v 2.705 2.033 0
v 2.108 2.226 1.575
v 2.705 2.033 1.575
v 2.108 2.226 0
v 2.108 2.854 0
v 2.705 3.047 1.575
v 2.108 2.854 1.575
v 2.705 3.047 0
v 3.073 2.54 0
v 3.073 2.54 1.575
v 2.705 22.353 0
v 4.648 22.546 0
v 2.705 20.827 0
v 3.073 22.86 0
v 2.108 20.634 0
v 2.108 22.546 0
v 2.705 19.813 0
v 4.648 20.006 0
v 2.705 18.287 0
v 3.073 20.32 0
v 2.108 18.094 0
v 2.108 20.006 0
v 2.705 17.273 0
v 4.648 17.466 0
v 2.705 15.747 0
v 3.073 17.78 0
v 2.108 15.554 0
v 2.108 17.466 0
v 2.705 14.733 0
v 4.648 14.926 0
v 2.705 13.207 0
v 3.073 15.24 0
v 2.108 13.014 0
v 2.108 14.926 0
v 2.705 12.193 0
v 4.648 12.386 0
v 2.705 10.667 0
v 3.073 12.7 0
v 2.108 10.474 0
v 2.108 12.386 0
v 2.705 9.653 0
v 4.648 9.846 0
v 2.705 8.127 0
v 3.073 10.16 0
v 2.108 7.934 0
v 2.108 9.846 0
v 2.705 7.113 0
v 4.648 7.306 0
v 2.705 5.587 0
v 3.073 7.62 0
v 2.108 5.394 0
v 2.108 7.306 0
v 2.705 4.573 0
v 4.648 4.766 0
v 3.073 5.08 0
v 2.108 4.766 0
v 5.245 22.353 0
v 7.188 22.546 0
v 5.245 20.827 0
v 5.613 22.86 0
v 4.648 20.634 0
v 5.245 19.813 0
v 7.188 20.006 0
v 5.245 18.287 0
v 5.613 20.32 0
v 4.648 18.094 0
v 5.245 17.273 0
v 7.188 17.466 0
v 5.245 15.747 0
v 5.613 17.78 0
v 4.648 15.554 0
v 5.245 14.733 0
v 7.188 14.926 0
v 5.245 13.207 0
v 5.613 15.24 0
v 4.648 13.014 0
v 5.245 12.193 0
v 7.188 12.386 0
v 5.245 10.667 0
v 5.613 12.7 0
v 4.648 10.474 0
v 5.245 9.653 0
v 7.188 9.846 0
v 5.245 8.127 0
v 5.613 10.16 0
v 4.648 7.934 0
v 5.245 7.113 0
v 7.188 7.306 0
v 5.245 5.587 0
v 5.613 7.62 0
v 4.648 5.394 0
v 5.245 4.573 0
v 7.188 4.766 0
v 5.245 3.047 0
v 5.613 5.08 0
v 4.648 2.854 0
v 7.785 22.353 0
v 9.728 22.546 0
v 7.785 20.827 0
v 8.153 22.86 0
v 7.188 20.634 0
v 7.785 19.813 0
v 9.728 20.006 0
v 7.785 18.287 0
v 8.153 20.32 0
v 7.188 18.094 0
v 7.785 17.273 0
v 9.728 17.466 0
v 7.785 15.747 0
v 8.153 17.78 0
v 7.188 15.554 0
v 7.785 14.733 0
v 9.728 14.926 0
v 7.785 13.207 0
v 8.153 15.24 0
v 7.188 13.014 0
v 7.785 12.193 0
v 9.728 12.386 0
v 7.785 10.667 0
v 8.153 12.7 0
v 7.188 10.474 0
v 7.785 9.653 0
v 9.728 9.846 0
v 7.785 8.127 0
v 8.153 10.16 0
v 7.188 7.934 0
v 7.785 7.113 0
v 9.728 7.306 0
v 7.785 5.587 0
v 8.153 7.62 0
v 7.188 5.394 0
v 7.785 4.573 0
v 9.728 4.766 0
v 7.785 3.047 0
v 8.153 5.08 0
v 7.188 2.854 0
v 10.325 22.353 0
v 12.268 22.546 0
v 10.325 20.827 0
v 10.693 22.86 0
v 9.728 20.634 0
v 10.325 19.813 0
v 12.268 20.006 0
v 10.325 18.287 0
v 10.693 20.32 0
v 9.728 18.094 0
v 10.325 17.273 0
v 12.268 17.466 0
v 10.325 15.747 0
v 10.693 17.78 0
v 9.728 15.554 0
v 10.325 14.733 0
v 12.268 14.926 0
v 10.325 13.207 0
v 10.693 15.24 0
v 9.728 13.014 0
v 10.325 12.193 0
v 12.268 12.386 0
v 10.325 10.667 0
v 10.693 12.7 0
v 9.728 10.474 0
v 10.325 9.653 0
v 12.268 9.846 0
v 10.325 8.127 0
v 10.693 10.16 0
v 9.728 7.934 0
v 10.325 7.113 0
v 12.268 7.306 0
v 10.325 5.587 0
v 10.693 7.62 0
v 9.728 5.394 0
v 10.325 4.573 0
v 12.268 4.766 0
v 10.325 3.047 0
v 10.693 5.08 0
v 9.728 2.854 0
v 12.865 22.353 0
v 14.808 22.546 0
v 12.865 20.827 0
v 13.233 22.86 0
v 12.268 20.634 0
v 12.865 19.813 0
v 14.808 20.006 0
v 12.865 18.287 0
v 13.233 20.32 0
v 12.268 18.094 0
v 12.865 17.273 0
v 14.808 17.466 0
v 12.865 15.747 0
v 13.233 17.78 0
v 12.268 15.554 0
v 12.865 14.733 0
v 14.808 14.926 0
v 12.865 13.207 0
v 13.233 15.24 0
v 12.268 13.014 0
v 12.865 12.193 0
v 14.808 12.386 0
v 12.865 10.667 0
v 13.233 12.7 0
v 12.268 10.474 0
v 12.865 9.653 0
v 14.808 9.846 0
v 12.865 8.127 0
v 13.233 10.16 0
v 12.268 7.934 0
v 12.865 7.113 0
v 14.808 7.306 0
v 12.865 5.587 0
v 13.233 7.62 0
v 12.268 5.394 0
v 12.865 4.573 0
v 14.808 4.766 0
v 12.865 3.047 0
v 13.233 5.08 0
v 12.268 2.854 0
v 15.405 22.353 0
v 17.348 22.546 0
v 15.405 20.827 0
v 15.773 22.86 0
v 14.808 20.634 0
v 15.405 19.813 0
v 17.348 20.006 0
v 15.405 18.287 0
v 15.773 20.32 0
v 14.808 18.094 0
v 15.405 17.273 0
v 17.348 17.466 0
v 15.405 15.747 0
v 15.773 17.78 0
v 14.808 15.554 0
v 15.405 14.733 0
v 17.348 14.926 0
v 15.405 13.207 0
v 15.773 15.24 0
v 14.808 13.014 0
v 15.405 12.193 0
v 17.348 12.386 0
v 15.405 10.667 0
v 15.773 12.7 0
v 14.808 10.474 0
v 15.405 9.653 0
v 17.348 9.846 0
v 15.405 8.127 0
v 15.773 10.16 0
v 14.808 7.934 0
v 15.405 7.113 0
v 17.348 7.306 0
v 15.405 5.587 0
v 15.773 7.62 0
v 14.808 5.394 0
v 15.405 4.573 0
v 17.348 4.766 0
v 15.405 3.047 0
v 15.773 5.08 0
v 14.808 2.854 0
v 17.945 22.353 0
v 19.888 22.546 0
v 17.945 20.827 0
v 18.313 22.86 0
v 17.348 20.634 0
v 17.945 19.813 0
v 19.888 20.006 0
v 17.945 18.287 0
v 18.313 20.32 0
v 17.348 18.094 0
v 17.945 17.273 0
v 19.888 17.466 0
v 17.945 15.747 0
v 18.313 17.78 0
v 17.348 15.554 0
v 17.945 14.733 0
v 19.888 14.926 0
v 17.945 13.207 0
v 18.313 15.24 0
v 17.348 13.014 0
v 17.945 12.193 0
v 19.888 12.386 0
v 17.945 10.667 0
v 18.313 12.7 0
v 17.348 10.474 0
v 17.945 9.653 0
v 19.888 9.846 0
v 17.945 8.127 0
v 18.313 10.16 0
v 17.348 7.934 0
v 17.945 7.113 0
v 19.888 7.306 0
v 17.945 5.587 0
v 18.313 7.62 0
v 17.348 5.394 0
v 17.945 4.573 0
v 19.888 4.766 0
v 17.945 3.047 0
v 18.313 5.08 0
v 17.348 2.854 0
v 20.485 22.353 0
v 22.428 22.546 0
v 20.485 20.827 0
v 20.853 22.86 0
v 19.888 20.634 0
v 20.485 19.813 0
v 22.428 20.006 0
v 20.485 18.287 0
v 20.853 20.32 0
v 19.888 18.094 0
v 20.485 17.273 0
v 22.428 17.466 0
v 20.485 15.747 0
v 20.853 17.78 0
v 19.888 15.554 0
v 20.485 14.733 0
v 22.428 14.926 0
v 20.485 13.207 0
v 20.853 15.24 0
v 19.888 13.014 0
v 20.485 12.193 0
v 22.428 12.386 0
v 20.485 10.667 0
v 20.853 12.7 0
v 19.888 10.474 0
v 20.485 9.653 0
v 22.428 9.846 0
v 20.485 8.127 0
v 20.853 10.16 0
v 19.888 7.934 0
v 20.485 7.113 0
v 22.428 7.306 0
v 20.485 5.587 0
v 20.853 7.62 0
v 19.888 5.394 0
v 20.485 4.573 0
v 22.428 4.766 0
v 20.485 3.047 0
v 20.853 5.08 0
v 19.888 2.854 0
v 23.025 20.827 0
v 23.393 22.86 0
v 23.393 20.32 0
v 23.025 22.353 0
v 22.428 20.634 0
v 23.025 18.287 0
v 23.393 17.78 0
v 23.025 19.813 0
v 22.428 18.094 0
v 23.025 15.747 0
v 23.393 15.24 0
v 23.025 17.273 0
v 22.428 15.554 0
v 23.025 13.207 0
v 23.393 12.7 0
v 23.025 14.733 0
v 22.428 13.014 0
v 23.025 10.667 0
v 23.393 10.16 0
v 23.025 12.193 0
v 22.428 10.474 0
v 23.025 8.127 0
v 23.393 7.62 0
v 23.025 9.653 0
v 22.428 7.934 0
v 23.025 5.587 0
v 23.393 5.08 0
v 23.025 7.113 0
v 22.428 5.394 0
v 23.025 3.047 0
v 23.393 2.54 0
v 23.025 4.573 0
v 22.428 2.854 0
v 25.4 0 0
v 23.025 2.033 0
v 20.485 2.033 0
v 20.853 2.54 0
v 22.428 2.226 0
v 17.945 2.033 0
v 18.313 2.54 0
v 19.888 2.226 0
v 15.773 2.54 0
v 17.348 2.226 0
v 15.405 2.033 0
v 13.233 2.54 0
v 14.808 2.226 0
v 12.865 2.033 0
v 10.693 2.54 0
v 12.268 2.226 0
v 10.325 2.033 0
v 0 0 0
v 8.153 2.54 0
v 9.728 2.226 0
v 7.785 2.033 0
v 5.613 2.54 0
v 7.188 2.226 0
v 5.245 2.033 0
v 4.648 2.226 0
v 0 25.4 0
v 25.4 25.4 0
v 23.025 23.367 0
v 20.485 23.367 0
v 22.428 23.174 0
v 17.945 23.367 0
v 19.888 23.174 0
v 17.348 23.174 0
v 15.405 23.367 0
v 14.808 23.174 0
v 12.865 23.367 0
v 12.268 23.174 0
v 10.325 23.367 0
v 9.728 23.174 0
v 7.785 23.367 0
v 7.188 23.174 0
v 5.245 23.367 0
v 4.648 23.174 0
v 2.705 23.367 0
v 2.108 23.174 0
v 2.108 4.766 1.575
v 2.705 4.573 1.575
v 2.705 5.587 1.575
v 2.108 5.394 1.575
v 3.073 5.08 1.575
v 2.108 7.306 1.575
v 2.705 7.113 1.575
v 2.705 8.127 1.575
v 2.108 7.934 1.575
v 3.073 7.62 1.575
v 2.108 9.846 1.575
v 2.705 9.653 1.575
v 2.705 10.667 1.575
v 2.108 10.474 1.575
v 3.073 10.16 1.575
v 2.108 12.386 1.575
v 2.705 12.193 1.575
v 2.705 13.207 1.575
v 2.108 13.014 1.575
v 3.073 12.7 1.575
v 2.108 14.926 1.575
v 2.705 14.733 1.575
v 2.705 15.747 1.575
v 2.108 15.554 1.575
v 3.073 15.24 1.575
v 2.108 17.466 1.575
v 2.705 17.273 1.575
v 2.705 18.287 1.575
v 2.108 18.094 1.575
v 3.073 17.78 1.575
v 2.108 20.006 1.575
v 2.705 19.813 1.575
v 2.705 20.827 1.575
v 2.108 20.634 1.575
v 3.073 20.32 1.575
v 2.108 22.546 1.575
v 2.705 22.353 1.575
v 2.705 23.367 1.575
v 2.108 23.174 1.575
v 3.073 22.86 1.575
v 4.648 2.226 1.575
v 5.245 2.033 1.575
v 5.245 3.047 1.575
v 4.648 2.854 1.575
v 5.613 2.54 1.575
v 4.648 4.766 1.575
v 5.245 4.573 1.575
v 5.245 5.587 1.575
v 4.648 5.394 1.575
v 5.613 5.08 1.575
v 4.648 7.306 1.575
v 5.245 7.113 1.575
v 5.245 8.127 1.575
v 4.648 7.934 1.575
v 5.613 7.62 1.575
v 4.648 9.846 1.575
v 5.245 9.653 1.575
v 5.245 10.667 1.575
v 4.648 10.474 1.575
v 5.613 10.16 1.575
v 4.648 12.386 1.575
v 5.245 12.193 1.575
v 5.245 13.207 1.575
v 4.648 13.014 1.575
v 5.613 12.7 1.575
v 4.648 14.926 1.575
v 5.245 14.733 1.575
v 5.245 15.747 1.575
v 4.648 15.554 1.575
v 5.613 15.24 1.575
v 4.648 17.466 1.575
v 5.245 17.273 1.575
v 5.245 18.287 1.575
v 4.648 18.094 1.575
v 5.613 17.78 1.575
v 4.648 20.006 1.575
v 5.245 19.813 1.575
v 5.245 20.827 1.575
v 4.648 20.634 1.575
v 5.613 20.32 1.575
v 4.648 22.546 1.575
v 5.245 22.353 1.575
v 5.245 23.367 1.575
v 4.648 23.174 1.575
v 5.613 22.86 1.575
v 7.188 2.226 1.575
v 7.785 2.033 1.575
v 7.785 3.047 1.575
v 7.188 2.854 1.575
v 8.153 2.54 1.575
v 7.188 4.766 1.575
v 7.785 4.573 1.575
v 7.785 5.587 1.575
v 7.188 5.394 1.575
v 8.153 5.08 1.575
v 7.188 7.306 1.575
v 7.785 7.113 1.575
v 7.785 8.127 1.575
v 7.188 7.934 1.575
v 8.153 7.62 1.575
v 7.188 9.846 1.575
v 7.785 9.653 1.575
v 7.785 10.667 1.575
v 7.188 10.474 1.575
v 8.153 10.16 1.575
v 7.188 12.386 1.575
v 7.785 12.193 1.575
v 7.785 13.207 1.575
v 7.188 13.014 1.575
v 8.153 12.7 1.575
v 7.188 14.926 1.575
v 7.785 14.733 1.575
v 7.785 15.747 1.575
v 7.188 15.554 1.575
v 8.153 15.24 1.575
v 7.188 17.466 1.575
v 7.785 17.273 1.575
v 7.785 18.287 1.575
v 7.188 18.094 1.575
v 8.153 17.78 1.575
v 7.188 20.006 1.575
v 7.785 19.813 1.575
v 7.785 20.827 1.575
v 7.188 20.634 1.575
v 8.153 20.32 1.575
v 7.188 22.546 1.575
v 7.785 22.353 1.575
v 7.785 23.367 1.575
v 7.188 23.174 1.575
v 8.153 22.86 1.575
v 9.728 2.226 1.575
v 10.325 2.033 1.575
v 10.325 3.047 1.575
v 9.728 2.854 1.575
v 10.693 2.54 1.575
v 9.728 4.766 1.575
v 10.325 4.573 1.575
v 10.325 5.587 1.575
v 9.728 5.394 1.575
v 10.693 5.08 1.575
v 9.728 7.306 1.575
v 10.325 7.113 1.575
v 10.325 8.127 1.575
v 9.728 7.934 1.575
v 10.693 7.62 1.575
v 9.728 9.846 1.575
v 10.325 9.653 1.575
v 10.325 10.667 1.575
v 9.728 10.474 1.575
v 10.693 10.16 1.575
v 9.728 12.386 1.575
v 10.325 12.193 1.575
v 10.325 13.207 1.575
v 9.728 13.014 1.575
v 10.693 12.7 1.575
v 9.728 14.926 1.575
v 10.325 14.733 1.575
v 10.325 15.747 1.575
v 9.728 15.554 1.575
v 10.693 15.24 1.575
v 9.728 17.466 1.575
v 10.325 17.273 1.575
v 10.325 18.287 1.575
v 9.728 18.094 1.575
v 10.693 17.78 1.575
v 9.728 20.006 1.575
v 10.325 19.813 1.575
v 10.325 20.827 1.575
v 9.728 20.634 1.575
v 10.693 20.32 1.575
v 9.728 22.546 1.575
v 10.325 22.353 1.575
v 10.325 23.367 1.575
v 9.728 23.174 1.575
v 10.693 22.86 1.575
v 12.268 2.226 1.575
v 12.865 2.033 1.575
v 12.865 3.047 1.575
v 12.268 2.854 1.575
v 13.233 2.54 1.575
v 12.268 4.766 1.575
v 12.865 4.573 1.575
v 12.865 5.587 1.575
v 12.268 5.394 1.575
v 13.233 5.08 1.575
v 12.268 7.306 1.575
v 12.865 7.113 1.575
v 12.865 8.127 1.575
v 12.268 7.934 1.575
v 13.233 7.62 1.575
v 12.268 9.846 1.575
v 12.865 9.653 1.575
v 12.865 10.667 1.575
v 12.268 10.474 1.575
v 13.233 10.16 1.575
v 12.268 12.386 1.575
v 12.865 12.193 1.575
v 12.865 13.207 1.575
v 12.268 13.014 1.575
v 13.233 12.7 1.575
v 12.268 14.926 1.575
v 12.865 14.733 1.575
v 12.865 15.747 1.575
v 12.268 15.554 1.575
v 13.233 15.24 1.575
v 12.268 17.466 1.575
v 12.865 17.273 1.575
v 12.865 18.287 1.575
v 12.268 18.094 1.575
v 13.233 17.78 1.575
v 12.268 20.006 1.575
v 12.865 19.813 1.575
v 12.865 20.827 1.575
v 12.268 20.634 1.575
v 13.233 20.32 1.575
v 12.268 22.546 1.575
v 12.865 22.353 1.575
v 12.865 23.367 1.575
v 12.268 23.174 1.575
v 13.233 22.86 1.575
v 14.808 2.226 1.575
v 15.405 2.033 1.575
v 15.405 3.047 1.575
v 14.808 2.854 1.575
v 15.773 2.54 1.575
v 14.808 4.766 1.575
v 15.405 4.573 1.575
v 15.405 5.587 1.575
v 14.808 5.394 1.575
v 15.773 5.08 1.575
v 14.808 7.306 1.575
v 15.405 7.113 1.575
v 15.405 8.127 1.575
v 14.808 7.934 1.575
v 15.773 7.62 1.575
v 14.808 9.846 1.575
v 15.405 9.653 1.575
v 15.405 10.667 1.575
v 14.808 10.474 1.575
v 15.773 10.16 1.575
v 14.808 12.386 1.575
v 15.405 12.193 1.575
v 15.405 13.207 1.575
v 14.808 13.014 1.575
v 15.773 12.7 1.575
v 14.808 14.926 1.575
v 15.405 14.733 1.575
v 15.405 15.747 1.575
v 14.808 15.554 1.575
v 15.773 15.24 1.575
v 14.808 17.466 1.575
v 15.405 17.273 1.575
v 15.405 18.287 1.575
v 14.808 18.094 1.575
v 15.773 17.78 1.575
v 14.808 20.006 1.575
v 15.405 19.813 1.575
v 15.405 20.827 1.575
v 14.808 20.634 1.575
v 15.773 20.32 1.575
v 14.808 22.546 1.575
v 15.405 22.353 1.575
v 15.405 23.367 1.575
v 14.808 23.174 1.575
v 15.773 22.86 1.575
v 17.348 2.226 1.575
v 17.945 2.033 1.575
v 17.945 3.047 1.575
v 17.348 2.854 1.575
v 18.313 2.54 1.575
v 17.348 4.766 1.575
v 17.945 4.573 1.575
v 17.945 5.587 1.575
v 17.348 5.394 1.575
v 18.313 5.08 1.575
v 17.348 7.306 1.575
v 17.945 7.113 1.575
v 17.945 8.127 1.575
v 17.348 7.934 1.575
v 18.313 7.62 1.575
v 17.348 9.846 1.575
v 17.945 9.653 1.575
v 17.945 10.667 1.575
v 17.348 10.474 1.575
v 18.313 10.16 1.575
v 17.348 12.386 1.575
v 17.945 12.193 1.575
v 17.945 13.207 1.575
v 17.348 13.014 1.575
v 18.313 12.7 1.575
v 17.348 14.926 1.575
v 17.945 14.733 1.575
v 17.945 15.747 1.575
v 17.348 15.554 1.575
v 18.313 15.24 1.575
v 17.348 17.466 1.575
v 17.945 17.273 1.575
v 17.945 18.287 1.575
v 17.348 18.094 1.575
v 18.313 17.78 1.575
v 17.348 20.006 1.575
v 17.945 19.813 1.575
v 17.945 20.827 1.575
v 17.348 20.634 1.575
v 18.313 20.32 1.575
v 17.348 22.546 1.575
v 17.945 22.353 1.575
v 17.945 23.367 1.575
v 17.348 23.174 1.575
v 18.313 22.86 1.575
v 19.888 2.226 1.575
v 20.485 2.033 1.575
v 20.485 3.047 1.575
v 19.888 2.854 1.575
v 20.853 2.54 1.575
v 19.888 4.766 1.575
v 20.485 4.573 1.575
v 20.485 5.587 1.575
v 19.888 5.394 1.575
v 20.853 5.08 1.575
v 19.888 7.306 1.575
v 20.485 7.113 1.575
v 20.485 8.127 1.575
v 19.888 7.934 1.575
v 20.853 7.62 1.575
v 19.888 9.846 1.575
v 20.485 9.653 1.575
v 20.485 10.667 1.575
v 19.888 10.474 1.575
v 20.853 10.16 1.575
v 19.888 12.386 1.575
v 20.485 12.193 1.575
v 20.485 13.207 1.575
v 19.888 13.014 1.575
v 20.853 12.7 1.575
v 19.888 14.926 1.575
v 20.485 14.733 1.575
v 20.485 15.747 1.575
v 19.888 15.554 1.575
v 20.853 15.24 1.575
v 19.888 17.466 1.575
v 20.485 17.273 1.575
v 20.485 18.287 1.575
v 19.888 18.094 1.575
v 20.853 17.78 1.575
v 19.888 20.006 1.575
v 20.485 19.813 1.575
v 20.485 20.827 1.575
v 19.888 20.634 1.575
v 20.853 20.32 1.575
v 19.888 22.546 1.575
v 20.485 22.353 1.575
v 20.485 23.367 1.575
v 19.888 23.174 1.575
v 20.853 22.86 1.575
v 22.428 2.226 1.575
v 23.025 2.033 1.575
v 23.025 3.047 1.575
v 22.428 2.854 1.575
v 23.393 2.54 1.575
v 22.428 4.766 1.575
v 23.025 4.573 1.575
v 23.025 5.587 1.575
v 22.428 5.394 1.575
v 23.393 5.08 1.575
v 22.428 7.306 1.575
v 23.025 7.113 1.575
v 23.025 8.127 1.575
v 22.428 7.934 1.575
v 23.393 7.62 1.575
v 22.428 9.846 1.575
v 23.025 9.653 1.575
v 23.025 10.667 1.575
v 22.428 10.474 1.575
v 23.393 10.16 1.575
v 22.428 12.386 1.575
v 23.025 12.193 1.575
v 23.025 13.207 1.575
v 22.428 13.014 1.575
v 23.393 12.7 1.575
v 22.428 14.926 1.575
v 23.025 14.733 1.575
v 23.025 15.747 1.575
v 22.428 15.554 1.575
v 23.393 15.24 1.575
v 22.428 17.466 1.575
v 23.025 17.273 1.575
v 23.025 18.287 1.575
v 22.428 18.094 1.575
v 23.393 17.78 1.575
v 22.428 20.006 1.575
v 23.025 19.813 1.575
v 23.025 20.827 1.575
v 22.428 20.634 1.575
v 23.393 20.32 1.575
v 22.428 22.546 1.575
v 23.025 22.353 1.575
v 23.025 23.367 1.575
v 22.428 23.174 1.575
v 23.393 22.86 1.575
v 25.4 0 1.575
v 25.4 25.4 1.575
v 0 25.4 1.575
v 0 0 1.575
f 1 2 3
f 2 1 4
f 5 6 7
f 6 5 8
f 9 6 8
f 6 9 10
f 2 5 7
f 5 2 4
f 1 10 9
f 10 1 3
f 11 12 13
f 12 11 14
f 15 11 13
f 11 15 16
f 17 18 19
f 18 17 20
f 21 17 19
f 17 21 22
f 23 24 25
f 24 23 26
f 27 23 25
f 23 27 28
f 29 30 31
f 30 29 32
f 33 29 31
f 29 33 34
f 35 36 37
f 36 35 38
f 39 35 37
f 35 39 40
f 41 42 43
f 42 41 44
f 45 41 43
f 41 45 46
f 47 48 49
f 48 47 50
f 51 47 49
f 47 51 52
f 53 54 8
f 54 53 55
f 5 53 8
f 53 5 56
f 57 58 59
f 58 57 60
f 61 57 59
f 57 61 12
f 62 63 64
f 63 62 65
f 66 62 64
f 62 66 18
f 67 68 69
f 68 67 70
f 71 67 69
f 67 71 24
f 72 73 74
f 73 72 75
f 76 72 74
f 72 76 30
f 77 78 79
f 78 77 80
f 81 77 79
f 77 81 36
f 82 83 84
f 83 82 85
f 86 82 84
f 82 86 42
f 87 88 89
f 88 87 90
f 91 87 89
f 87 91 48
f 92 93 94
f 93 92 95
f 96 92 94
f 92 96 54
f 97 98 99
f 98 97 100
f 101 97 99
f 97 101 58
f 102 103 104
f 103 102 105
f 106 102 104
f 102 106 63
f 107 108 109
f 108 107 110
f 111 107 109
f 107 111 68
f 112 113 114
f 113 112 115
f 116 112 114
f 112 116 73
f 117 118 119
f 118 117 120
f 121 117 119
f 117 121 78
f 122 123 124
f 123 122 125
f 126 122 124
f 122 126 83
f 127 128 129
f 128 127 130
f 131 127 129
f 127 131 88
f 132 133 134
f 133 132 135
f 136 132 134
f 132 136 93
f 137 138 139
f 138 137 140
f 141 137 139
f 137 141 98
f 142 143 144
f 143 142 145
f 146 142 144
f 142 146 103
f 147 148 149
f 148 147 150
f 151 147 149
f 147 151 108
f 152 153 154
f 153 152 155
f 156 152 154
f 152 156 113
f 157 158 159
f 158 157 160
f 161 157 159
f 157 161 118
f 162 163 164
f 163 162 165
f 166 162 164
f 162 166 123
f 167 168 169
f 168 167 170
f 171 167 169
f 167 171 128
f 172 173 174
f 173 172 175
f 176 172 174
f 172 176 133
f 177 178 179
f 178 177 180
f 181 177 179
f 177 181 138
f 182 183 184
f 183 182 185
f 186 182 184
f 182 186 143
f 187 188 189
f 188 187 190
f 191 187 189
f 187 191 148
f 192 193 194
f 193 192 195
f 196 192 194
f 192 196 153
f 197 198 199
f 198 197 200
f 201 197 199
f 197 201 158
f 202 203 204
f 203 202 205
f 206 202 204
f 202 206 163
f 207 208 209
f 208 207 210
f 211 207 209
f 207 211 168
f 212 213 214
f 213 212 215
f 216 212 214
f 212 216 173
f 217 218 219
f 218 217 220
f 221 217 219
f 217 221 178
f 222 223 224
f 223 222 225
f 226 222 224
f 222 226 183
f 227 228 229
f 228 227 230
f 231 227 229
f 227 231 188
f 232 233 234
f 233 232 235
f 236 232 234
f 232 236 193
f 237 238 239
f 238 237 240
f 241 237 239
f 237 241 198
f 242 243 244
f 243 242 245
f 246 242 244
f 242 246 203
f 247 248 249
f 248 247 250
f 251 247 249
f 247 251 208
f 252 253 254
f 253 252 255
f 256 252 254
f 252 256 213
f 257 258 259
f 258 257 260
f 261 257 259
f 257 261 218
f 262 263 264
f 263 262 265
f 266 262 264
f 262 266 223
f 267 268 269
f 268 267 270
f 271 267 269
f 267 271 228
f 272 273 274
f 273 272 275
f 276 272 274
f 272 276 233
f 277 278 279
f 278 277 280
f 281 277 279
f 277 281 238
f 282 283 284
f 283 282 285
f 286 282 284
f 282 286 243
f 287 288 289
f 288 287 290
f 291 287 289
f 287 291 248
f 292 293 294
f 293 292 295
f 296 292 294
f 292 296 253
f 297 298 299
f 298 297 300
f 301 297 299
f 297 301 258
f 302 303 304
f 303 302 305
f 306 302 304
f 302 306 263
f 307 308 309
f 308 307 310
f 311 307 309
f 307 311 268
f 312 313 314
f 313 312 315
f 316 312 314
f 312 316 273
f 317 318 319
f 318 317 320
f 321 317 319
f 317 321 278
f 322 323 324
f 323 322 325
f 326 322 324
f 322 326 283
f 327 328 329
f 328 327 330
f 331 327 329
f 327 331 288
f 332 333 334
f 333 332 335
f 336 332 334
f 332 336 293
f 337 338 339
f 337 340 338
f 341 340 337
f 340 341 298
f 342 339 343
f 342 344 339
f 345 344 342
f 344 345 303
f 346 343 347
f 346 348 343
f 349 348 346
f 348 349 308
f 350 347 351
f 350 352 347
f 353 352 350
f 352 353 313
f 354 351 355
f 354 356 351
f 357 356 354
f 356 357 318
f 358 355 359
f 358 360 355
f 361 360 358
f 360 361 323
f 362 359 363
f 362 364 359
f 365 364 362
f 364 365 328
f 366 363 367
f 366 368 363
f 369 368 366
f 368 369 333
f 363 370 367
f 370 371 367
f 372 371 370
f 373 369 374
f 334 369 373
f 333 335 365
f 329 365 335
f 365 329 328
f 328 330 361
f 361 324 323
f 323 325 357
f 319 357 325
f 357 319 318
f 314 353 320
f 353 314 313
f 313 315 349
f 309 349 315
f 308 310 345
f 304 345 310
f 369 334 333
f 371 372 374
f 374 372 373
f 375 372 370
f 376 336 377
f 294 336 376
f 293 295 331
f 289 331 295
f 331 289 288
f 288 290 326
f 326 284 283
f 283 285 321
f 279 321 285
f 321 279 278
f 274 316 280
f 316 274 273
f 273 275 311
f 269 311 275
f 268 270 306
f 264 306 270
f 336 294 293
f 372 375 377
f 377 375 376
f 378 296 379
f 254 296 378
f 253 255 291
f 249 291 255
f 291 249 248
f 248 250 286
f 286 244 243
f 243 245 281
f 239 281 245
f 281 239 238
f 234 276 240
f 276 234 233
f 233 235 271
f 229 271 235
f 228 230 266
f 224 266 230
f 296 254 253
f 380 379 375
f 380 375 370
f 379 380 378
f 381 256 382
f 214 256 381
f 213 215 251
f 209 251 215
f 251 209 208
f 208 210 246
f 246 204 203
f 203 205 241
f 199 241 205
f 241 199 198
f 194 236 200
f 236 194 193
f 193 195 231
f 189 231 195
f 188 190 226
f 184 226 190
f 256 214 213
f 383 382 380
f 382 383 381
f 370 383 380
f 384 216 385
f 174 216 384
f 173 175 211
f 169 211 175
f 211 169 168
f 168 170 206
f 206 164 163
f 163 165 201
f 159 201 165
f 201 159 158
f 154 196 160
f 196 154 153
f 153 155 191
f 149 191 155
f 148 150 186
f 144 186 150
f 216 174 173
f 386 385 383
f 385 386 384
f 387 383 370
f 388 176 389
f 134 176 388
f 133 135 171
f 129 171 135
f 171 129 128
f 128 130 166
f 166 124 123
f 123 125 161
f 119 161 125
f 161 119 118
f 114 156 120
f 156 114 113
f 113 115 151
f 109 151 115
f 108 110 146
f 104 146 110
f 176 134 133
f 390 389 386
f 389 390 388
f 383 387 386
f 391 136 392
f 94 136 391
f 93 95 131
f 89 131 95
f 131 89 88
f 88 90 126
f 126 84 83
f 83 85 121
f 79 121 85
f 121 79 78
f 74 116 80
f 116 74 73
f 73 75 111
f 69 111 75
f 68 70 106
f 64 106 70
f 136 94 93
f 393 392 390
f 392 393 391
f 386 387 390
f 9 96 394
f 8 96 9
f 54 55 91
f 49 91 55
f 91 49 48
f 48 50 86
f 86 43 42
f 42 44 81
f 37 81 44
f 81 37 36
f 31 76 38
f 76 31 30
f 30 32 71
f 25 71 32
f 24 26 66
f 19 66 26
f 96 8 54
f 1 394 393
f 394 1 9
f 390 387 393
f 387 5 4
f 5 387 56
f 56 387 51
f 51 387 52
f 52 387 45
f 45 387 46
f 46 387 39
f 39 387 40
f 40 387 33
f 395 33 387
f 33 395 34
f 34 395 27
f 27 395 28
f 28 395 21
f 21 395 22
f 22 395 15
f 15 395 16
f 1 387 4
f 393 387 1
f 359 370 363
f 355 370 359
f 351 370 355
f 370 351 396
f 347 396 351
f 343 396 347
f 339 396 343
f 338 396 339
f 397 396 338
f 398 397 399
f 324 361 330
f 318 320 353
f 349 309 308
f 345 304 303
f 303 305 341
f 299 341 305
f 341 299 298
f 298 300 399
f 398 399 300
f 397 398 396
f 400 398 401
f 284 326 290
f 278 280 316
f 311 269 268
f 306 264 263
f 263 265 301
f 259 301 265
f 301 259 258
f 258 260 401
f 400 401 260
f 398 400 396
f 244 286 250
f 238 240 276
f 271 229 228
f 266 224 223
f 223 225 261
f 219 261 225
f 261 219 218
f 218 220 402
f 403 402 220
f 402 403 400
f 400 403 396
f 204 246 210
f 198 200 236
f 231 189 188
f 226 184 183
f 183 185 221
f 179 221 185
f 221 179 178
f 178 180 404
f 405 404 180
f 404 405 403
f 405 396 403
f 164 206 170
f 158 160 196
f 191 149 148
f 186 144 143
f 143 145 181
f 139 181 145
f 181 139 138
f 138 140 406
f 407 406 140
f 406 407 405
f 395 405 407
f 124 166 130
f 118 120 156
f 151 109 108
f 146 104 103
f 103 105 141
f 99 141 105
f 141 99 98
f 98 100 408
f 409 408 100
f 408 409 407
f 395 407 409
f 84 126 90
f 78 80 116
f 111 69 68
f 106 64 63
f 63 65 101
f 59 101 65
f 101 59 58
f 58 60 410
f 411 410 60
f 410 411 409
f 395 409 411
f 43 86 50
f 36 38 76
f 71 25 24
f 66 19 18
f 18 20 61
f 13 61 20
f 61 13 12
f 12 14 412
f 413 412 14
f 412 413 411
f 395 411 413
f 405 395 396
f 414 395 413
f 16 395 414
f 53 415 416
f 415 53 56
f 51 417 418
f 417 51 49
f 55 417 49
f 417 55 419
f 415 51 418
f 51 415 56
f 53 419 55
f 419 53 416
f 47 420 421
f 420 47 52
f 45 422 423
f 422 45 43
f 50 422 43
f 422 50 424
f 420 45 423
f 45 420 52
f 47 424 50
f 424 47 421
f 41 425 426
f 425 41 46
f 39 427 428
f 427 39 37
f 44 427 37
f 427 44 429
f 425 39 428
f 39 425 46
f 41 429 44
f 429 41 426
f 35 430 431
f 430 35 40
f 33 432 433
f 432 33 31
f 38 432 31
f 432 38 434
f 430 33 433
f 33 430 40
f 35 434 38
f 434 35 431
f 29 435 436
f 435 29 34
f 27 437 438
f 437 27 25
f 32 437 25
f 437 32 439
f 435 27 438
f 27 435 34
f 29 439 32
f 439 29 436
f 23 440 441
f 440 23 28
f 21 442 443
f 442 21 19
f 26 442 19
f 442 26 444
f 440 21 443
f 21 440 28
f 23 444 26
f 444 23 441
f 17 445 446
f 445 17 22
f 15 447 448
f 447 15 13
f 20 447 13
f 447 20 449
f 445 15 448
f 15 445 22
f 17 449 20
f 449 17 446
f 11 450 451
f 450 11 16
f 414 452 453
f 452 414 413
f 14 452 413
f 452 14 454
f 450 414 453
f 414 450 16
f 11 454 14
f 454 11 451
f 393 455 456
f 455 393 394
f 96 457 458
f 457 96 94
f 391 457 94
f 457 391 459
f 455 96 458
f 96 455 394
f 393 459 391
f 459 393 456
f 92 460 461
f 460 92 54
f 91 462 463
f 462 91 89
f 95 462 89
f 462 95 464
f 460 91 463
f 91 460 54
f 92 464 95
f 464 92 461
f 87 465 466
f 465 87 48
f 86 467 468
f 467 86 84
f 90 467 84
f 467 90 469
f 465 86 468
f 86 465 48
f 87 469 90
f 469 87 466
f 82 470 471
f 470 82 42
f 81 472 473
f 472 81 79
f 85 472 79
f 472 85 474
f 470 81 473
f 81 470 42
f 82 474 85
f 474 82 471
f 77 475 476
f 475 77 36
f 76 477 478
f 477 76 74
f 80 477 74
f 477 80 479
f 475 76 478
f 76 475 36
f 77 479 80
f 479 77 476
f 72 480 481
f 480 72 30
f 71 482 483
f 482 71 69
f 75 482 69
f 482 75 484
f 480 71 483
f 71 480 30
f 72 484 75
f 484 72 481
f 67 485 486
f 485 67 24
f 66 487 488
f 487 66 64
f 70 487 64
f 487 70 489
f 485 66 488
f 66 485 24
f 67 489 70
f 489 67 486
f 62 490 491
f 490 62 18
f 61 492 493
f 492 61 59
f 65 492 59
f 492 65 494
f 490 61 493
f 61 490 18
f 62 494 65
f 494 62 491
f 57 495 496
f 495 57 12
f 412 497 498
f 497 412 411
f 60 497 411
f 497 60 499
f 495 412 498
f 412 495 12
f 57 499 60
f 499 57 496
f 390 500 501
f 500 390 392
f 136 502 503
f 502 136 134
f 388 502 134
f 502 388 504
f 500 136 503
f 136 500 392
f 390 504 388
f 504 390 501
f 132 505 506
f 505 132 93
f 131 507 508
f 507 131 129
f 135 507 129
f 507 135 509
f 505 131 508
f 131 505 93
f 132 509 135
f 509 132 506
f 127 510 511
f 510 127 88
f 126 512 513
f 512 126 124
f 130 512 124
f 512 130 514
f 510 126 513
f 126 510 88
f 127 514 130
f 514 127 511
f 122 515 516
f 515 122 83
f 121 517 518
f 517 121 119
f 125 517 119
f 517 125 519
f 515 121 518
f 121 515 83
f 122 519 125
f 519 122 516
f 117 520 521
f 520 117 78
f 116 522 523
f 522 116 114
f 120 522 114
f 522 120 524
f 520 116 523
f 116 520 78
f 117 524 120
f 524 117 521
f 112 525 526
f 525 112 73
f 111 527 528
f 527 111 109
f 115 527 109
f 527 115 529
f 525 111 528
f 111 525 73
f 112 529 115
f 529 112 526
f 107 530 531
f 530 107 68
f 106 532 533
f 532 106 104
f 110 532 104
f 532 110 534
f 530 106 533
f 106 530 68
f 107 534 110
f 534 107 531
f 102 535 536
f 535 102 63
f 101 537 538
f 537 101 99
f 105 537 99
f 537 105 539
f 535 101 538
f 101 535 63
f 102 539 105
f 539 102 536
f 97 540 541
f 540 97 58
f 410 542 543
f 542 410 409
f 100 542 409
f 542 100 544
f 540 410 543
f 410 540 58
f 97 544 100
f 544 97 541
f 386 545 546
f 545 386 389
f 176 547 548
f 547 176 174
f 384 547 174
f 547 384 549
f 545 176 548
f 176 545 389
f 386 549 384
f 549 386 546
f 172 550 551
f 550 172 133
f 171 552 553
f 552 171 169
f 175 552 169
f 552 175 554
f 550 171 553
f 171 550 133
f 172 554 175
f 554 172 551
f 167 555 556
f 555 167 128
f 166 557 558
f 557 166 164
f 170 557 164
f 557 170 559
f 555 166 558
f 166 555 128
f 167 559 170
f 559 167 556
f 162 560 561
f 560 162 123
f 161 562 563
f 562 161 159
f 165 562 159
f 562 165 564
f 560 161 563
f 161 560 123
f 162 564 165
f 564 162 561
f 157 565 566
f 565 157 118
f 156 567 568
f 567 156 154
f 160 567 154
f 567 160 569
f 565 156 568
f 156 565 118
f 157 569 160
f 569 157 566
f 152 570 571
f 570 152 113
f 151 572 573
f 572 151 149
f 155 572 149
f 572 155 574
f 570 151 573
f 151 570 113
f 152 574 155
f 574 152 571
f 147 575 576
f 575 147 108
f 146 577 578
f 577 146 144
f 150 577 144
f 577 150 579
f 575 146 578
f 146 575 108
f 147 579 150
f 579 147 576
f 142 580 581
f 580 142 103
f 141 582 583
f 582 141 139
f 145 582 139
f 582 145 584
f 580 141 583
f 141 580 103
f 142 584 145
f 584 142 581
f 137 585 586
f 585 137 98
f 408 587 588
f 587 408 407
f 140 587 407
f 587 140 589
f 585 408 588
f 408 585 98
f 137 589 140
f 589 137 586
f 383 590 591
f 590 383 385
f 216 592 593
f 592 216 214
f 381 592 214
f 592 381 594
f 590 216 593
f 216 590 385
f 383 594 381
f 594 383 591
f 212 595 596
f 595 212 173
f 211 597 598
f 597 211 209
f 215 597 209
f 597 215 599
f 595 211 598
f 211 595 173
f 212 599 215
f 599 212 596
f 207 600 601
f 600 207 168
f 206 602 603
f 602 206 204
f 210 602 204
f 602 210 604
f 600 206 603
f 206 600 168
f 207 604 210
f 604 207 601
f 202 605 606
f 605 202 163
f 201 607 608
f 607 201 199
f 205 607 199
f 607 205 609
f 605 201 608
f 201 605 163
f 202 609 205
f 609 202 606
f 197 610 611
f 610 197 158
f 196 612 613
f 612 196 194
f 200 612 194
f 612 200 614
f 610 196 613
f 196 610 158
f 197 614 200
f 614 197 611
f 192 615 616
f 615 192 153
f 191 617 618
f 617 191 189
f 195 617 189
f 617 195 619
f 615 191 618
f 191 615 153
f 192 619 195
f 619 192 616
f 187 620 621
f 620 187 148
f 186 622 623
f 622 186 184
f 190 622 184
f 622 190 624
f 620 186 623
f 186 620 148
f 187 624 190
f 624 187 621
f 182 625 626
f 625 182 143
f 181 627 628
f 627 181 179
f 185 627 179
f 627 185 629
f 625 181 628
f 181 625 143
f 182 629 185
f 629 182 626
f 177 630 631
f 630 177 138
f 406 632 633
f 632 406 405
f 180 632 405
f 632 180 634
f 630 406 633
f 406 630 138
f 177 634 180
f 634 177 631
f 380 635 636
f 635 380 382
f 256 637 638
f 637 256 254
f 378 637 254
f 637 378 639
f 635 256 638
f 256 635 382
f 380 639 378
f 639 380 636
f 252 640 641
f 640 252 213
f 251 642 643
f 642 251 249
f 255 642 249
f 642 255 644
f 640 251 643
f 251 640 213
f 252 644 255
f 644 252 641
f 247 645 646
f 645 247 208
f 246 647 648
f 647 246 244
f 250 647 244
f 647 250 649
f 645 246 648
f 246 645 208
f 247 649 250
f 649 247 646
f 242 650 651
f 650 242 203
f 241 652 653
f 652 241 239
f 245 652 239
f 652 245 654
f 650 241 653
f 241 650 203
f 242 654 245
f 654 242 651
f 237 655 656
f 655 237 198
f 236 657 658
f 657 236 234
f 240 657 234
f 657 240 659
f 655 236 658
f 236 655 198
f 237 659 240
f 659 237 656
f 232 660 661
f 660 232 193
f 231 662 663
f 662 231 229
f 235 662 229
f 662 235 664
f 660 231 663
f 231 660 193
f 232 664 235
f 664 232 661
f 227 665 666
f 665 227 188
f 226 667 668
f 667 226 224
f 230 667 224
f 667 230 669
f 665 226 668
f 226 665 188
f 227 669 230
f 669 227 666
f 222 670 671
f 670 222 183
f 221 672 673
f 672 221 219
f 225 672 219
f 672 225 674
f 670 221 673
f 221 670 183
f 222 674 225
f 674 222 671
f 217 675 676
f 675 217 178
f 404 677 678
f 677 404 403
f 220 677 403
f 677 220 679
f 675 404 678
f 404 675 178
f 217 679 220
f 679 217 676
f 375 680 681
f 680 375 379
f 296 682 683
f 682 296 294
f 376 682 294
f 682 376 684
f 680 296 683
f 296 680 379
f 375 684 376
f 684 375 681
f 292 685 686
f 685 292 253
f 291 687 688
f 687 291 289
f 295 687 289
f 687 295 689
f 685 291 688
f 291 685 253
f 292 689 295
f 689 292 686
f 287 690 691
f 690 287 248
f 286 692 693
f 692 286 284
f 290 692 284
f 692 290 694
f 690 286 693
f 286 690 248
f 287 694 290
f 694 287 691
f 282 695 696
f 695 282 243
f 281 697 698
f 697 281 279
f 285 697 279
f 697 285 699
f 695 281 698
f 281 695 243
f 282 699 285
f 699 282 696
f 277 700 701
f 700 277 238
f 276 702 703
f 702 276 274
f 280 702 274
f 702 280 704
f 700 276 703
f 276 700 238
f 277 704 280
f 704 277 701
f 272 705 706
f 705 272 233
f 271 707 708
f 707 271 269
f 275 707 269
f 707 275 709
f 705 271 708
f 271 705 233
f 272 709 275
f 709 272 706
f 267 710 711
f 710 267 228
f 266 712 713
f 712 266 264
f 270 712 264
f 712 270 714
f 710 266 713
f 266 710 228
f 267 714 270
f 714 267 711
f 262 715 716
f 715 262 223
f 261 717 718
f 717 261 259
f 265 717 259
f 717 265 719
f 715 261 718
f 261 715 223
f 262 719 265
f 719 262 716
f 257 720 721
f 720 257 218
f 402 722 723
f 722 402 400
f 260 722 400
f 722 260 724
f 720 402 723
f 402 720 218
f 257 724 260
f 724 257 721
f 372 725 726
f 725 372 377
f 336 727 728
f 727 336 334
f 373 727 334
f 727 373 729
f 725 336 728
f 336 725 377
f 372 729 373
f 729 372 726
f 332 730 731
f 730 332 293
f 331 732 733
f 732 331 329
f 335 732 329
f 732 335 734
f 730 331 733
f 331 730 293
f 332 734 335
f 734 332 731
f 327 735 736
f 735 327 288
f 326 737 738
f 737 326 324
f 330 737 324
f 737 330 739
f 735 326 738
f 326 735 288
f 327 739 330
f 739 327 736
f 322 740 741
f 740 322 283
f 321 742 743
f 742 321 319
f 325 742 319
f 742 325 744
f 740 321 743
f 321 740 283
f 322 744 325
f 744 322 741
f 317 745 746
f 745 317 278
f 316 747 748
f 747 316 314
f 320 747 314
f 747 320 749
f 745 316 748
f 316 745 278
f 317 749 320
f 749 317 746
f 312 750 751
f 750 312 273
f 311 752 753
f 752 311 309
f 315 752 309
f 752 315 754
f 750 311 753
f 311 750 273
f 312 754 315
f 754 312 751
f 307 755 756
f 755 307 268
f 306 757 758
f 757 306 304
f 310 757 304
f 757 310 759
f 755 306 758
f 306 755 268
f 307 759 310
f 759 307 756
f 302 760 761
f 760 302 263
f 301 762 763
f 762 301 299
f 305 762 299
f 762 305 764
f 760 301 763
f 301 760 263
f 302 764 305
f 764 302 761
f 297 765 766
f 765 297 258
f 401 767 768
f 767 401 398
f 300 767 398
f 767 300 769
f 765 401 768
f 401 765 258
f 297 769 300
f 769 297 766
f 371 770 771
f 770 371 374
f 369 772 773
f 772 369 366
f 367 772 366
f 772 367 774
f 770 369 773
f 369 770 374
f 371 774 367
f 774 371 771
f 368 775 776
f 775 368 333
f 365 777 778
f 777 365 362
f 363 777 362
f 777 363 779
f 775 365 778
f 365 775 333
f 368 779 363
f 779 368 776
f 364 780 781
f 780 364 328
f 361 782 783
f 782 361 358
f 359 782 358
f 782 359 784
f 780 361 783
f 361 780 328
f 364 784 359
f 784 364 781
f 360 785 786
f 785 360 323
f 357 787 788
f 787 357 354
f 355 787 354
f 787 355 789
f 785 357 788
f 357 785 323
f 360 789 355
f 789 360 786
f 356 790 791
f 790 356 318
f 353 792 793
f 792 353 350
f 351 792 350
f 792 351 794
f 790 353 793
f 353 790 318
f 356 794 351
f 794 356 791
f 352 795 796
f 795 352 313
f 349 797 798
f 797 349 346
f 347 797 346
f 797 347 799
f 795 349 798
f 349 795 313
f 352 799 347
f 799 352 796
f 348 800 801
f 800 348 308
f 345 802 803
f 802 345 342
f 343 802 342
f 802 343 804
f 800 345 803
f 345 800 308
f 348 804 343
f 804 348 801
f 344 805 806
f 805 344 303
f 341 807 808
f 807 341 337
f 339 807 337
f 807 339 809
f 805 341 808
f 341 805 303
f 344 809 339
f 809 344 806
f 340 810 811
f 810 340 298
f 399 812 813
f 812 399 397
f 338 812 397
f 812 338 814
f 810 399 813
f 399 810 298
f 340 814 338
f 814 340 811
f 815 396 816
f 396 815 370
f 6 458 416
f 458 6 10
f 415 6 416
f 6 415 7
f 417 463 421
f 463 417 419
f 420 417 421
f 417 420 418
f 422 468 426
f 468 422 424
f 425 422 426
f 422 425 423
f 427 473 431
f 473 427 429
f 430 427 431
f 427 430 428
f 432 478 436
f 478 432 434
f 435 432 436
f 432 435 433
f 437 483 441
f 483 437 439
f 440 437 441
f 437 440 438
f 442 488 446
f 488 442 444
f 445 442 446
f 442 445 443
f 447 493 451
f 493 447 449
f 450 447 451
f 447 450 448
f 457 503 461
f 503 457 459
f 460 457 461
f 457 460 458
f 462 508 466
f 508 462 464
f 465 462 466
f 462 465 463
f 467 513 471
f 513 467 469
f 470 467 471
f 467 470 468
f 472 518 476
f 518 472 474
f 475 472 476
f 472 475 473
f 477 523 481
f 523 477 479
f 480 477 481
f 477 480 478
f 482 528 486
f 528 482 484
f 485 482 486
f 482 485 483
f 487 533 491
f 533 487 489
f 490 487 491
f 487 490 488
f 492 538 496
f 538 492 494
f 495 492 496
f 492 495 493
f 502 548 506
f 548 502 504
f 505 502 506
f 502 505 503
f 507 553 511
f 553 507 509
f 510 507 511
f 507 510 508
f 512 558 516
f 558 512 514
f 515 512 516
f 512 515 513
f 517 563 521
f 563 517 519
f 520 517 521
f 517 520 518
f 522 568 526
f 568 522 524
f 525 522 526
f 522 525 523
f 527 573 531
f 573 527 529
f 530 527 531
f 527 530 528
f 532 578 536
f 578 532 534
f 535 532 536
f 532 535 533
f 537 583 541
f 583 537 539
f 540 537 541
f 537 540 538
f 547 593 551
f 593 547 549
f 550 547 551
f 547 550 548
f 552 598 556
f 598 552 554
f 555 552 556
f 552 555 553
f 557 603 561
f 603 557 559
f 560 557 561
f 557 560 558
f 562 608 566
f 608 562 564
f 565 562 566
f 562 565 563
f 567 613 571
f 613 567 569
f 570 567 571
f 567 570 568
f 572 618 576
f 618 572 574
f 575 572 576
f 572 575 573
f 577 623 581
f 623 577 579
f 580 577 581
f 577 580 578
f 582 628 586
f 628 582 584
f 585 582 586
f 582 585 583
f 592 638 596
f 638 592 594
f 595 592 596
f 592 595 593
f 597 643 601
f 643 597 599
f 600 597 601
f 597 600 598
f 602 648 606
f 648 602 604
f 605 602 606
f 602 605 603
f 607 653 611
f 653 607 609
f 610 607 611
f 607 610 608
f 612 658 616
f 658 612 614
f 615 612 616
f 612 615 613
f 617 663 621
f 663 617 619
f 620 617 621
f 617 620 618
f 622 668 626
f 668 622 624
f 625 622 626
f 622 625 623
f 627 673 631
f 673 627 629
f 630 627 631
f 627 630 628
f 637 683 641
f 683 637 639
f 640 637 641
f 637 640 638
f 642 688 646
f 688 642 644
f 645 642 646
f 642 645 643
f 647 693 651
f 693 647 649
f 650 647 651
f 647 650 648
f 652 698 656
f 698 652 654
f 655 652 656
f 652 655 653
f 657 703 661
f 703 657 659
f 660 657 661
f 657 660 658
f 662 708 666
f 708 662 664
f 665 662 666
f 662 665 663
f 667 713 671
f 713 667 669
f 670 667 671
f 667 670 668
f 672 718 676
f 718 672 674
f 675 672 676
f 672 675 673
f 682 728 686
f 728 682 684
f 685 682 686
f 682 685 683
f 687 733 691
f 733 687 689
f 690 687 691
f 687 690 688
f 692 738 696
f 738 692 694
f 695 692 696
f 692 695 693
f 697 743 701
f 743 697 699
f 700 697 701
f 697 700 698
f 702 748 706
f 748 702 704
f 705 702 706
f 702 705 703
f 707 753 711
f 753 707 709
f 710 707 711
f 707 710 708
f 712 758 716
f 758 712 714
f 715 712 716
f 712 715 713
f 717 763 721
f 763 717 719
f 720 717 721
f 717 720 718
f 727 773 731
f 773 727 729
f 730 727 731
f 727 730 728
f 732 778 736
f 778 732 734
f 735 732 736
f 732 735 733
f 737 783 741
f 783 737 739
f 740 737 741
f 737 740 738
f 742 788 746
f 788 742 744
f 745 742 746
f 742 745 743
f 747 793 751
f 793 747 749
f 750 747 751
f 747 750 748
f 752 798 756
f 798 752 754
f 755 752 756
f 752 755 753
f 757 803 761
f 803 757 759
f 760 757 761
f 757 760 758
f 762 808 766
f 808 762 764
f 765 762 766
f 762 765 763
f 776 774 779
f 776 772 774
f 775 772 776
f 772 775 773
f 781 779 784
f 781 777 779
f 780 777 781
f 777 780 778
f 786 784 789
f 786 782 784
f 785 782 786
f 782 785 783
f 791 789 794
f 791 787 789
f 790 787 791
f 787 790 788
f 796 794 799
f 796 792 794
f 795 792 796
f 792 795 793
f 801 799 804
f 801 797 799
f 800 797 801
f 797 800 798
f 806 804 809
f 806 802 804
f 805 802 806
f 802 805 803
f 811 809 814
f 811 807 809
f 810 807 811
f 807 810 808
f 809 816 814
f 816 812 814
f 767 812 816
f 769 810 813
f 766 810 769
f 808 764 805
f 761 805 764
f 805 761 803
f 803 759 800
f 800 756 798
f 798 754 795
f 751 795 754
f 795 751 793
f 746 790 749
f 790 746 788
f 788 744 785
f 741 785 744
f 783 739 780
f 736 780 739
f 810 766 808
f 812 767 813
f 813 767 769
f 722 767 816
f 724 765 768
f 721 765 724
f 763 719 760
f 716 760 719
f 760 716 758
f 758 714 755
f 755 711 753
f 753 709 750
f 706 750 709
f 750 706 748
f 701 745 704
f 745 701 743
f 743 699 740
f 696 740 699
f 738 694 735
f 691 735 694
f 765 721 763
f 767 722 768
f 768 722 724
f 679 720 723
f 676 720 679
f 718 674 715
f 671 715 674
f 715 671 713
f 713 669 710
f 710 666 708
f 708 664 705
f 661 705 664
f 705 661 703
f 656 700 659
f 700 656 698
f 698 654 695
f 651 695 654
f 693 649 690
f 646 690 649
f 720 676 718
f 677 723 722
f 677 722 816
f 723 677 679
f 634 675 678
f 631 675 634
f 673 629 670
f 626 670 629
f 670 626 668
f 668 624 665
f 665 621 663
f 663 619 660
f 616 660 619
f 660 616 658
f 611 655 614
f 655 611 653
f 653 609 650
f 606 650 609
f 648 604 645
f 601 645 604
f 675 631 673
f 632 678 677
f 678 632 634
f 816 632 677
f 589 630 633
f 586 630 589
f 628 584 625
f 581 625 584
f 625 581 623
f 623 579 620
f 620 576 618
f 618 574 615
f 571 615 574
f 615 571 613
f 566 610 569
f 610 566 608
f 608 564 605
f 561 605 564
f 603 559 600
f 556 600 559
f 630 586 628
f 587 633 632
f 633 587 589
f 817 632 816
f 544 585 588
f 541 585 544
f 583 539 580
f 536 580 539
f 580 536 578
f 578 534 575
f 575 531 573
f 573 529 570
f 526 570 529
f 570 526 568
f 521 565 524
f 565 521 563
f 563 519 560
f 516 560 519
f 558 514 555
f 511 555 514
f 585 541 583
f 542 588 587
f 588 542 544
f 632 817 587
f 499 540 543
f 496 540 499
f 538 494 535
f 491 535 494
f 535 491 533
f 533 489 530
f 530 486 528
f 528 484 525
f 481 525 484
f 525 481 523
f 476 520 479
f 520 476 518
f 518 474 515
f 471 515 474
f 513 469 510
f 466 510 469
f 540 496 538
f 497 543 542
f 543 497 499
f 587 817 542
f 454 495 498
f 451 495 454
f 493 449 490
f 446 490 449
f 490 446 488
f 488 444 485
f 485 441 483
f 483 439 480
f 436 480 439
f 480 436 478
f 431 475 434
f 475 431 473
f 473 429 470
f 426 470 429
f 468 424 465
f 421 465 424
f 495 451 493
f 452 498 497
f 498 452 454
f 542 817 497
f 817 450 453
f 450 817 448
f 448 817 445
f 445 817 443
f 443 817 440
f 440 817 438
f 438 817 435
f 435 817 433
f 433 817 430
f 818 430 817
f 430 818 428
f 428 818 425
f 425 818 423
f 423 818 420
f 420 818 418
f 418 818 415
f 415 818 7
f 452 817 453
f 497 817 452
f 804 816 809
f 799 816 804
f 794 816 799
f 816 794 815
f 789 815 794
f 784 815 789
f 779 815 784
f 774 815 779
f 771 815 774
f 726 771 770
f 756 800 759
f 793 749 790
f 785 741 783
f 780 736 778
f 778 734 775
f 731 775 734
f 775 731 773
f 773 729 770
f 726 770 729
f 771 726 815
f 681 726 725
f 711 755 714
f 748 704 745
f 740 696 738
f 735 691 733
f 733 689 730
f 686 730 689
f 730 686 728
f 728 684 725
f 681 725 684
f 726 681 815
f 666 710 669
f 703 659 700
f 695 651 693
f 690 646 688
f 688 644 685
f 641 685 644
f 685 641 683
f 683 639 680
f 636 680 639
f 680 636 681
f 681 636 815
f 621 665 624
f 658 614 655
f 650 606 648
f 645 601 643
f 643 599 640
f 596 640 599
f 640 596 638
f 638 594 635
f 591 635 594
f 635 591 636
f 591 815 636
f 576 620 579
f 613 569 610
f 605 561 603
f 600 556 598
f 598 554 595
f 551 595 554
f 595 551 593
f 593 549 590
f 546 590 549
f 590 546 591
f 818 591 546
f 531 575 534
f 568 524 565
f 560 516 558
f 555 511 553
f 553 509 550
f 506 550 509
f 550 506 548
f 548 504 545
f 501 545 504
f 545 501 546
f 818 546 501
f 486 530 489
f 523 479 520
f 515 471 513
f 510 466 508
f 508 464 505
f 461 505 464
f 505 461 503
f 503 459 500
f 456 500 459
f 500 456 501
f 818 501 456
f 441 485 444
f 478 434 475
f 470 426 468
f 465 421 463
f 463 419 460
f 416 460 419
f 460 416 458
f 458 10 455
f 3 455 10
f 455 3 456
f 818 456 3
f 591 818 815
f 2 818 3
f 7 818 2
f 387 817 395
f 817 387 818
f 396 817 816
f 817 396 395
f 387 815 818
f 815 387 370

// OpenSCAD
// Perfboard Generator
// Author: Wing Tang Wong
// Description: parametrically create a normal perfboard of a given
//              dimension.
// 

/*Customizer Variables*/
/*[Perfboard]*/
board_width = 1;
board_length = 1;
hole_spacing = 0.10; //[0.05:0.05 inch(compact), 0.10:0.10 inch(normal)]
hole_diameter = 0.042; //[0.028:0.028 inch(compact), 0.035:0.035 inch(normal/plated), 0.042:0.042 inch(normal)]

metric_or_imperial = 25.4; //[1:Metric, 25.4:Imperial]


/*[Hidden]*/
// Perfboard generator
$FN=8;
spacing=hole_spacing * metric_or_imperial  ; // 0.1" spacing or 2.54mm spacing of the holes.
holes=(hole_diameter * metric_or_imperial) ; // 0.042" or 1.0668mm holes

board_w =  board_width * metric_or_imperial ; // 4"
board_l = board_length * metric_or_imperial ; // 4"

board_h = 0.062 * 25.4 ; // 0.062" or 1.6mm height 

x_max = ( ( board_w - ( 2 * spacing ) ) / spacing );
y_max = ( ( board_l - ( 2 * spacing ) ) / spacing );

difference() {
	cube( [ board_w, board_l, board_h ] );

for (x = [0:x_max]) 
{
	for(y = [0:y_max])
	{
    //translate([(x * spacing) + spacing , (y * spacing) + spacing ,0]) 
	//	cube( [holes, holes, board_h * 4] , center = true );
    translate([(x * spacing) + spacing , (y * spacing) + spacing ,0]) 
		cylinder( r=holes/2.00 , h = board_h * 4 );
	};	
};

};
